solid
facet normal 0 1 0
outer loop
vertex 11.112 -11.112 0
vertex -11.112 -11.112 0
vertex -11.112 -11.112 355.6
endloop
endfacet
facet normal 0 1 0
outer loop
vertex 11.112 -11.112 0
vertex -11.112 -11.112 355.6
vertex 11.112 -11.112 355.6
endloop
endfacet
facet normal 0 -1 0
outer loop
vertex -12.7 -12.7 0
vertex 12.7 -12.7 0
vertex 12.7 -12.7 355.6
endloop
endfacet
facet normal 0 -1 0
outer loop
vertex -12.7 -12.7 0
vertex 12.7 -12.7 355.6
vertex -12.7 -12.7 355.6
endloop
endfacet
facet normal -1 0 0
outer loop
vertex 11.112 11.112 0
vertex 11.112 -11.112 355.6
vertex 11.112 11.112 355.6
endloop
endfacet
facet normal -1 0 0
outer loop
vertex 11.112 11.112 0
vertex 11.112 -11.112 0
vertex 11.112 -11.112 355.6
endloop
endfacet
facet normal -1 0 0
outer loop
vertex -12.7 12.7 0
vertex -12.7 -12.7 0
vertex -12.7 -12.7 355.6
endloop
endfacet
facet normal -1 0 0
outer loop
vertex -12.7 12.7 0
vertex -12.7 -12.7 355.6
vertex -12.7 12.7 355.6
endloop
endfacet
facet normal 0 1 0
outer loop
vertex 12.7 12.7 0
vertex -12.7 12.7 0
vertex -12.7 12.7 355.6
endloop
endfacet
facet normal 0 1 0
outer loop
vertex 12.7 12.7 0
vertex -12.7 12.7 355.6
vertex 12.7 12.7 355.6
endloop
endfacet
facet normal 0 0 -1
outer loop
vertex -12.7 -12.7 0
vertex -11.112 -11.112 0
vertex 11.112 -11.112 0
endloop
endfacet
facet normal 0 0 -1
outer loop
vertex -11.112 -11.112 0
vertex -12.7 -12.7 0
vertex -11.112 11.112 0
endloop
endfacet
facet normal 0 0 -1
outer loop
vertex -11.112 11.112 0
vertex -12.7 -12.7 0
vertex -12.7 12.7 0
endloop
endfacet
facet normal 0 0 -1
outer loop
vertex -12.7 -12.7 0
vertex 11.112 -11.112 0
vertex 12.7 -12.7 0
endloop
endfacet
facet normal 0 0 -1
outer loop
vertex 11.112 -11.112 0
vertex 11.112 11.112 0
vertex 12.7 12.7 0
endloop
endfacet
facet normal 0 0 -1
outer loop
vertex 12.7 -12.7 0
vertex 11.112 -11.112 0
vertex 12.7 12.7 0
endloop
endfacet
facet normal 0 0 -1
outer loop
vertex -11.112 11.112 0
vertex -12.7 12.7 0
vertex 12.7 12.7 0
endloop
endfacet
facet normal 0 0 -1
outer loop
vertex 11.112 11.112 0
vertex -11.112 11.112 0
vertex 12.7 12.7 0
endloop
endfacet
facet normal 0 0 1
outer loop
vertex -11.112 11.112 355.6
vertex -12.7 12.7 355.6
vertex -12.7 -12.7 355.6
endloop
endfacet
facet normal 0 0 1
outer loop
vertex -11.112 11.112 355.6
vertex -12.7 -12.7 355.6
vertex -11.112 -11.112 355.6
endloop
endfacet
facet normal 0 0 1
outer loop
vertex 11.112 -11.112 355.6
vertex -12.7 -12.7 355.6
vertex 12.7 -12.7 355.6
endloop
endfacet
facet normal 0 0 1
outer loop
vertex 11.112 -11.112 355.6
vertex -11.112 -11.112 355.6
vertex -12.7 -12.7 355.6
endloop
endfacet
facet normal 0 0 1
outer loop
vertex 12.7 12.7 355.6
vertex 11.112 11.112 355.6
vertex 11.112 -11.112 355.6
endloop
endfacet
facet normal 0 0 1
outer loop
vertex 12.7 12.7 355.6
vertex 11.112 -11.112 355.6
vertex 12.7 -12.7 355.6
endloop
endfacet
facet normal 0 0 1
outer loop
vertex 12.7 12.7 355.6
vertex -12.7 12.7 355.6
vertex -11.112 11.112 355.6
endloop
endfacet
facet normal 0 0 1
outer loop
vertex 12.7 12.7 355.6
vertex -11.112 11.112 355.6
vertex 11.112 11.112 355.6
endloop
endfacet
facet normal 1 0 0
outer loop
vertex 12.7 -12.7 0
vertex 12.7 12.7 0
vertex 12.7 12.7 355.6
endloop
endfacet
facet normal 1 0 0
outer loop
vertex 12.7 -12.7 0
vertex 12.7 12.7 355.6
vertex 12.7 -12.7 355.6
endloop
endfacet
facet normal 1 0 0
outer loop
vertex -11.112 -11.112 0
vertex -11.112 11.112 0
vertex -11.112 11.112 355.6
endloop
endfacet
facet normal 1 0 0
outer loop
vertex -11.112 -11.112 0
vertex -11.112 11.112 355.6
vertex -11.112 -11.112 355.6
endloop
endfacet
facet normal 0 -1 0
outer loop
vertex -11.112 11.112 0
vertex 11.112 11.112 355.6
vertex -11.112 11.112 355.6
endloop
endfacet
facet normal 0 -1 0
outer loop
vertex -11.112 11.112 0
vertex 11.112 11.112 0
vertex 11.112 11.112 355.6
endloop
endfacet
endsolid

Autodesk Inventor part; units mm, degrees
ref_plane "YZ Plane" through (0, 0, 0) normal (1, 0, 0) x (0, 1, 0)
ref_plane "XZ Plane" through (0, 0, 0) normal (0, 1, 0) x (-1, 0, 0)
ref_plane "XY Plane" through (0, 0, 0) normal (0, 0, 1) x (1, 0, 0)
sketch "Sketch1" plane through (0, 0, 0) normal (0, 0, 1) x (1, 0, 0)
  line L0 (-12.7, -12.7) -> (-12.7, 12.7)
  line L1 (-12.7, 12.7) -> (12.7, 12.7)
  line L2 (12.7, 12.7) -> (12.7, -12.7)
  line L3 (12.7, -12.7) -> (-12.7, -12.7)
  line L4 (-12.7, -12.7) -> (12.7, 12.7) construction
  line L5 (-12.7, 12.7) -> (12.7, -12.7) construction
  line L6 (11.1125, 11.1125) -> (-11.1125, 11.1125)
  line L7 (-11.1125, 11.1125) -> (-11.1125, -11.1125)
  line L8 (-11.1125, -11.1125) -> (11.1125, -11.1125)
  line L9 (11.1125, -11.1125) -> (11.1125, 11.1125)
  point P0 (0, 0)
  dimension "d0" = 25.4
  dimension "d1" = 25.4
  dimension "d2" = 1.5875
extrude "Extrusion1" add sketch "Sketch1" along normal blind 355.6
equation "\"d1\" = d0"
properties part number "14in long 1in square tube"
